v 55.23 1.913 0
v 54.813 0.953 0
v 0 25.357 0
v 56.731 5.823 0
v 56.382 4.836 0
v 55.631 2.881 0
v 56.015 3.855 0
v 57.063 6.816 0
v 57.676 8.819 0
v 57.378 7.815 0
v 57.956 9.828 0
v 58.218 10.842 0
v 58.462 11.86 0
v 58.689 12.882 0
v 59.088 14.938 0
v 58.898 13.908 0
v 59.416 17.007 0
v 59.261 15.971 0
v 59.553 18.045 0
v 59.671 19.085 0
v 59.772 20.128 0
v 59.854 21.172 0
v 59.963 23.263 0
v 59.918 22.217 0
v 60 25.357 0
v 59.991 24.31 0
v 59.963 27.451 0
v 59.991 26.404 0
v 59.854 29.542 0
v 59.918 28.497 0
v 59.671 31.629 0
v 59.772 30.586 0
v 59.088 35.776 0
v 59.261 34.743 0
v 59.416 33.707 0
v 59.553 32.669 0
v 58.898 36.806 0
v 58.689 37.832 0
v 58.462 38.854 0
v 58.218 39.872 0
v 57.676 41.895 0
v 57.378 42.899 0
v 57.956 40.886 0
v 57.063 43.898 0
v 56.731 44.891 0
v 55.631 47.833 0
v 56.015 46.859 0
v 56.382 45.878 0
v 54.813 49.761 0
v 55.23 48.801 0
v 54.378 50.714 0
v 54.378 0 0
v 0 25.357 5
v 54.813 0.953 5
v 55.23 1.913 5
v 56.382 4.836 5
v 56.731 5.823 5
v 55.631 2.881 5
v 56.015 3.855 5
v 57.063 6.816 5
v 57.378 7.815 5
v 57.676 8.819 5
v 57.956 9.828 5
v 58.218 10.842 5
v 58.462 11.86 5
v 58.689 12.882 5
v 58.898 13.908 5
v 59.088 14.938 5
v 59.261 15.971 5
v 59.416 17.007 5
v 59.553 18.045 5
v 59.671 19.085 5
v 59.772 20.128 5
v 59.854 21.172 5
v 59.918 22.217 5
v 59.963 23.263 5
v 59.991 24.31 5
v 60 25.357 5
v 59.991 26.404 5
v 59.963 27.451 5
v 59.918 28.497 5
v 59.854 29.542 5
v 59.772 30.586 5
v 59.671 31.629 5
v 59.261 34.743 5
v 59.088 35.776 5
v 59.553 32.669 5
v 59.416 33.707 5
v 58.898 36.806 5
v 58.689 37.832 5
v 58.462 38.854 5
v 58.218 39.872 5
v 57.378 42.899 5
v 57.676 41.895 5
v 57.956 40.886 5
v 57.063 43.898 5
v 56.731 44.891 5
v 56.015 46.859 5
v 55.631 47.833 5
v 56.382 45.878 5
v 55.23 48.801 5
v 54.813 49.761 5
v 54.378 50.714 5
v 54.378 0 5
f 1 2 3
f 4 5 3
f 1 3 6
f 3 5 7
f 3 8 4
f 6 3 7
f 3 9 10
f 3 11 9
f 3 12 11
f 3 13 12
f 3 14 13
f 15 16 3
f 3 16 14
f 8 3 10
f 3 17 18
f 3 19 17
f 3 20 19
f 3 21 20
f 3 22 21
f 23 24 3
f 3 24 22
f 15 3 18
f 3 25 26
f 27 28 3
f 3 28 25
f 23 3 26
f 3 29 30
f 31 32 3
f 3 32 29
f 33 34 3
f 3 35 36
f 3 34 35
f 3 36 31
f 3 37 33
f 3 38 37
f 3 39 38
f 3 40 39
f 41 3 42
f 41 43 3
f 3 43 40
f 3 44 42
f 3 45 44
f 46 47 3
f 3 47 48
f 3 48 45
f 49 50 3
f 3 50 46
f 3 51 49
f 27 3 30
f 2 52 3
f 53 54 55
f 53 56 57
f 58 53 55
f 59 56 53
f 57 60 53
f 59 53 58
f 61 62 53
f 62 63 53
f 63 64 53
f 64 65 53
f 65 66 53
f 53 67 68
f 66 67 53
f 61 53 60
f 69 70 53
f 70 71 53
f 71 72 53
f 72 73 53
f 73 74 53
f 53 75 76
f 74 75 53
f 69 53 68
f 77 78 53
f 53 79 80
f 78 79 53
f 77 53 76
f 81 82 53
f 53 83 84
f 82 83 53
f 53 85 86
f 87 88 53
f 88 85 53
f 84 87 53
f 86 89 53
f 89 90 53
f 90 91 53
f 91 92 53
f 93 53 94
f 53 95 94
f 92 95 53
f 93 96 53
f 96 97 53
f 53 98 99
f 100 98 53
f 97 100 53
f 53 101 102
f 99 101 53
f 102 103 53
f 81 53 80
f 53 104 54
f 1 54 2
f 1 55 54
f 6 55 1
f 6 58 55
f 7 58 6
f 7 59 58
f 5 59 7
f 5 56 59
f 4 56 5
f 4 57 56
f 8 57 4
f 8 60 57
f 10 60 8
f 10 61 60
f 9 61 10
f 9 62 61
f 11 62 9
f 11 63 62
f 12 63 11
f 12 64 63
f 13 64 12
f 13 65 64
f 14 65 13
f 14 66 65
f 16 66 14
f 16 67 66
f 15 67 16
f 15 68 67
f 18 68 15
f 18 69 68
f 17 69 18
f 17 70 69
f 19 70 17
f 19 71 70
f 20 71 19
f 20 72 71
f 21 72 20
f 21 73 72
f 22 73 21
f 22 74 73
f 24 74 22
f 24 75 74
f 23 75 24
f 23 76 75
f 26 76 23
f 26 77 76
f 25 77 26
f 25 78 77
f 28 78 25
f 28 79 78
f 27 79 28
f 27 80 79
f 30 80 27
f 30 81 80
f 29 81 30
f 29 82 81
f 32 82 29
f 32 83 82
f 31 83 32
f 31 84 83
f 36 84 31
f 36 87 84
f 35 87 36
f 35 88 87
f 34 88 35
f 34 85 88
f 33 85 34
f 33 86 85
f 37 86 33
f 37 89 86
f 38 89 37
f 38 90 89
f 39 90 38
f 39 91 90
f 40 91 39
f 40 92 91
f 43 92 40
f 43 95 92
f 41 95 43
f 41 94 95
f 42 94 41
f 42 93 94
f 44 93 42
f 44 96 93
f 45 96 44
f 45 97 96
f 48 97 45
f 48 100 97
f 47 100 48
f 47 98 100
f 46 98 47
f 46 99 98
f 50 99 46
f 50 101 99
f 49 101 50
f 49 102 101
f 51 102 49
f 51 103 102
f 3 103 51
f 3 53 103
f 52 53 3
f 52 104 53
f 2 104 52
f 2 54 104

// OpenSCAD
$fn = 32;

// ----------------------------------------------------------------------
// Arc profile plate: sector, 52 points
// ----------------------------------------------------------------------

// --- parameters (mm) ---
sector_angle = 50;        // sector angle, degrees
sector_r = 60;            // outer radius
arc_step = 1;             // sampling step of the arc, degrees
plate_t = 5;              // plate thickness, Z

bbox_x = 2 * sector_r * sin(sector_angle / 2);  // chord of the sector
bbox_y = sector_r;  // depth of the sector (apex to arc)

profile = [[54.378, 0], [54.813, 0.953], [55.23, 1.913], [55.631, 2.881], [56.015, 3.855], [56.382, 4.836], [56.731, 5.823], [57.063, 6.816], [57.378, 7.815], [57.676, 8.819], [57.956, 9.828], [58.218, 10.842], [58.462, 11.86], [58.689, 12.882], [58.898, 13.908], [59.088, 14.938], [59.261, 15.971], [59.416, 17.007], [59.553, 18.045], [59.671, 19.085], [59.772, 20.128], [59.854, 21.172], [59.918, 22.217], [59.963, 23.263], [59.991, 24.31], [60, 25.357], [59.991, 26.404], [59.963, 27.451], [59.918, 28.497], [59.854, 29.542], [59.772, 30.586], [59.671, 31.629], [59.553, 32.669], [59.416, 33.707], [59.261, 34.743], [59.088, 35.776], [58.898, 36.806], [58.689, 37.832], [58.462, 38.854], [58.218, 39.872], [57.956, 40.886], [57.676, 41.895], [57.378, 42.899], [57.063, 43.898], [56.731, 44.891], [56.382, 45.878], [56.015, 46.859], [55.631, 47.833], [55.23, 48.801], [54.813, 49.761], [54.378, 50.714], [0, 25.357]];  // primary outline, 52 points, counter clockwise

// --- the one profile operation ---
linear_extrude(height = plate_t) polygon(points = profile);
